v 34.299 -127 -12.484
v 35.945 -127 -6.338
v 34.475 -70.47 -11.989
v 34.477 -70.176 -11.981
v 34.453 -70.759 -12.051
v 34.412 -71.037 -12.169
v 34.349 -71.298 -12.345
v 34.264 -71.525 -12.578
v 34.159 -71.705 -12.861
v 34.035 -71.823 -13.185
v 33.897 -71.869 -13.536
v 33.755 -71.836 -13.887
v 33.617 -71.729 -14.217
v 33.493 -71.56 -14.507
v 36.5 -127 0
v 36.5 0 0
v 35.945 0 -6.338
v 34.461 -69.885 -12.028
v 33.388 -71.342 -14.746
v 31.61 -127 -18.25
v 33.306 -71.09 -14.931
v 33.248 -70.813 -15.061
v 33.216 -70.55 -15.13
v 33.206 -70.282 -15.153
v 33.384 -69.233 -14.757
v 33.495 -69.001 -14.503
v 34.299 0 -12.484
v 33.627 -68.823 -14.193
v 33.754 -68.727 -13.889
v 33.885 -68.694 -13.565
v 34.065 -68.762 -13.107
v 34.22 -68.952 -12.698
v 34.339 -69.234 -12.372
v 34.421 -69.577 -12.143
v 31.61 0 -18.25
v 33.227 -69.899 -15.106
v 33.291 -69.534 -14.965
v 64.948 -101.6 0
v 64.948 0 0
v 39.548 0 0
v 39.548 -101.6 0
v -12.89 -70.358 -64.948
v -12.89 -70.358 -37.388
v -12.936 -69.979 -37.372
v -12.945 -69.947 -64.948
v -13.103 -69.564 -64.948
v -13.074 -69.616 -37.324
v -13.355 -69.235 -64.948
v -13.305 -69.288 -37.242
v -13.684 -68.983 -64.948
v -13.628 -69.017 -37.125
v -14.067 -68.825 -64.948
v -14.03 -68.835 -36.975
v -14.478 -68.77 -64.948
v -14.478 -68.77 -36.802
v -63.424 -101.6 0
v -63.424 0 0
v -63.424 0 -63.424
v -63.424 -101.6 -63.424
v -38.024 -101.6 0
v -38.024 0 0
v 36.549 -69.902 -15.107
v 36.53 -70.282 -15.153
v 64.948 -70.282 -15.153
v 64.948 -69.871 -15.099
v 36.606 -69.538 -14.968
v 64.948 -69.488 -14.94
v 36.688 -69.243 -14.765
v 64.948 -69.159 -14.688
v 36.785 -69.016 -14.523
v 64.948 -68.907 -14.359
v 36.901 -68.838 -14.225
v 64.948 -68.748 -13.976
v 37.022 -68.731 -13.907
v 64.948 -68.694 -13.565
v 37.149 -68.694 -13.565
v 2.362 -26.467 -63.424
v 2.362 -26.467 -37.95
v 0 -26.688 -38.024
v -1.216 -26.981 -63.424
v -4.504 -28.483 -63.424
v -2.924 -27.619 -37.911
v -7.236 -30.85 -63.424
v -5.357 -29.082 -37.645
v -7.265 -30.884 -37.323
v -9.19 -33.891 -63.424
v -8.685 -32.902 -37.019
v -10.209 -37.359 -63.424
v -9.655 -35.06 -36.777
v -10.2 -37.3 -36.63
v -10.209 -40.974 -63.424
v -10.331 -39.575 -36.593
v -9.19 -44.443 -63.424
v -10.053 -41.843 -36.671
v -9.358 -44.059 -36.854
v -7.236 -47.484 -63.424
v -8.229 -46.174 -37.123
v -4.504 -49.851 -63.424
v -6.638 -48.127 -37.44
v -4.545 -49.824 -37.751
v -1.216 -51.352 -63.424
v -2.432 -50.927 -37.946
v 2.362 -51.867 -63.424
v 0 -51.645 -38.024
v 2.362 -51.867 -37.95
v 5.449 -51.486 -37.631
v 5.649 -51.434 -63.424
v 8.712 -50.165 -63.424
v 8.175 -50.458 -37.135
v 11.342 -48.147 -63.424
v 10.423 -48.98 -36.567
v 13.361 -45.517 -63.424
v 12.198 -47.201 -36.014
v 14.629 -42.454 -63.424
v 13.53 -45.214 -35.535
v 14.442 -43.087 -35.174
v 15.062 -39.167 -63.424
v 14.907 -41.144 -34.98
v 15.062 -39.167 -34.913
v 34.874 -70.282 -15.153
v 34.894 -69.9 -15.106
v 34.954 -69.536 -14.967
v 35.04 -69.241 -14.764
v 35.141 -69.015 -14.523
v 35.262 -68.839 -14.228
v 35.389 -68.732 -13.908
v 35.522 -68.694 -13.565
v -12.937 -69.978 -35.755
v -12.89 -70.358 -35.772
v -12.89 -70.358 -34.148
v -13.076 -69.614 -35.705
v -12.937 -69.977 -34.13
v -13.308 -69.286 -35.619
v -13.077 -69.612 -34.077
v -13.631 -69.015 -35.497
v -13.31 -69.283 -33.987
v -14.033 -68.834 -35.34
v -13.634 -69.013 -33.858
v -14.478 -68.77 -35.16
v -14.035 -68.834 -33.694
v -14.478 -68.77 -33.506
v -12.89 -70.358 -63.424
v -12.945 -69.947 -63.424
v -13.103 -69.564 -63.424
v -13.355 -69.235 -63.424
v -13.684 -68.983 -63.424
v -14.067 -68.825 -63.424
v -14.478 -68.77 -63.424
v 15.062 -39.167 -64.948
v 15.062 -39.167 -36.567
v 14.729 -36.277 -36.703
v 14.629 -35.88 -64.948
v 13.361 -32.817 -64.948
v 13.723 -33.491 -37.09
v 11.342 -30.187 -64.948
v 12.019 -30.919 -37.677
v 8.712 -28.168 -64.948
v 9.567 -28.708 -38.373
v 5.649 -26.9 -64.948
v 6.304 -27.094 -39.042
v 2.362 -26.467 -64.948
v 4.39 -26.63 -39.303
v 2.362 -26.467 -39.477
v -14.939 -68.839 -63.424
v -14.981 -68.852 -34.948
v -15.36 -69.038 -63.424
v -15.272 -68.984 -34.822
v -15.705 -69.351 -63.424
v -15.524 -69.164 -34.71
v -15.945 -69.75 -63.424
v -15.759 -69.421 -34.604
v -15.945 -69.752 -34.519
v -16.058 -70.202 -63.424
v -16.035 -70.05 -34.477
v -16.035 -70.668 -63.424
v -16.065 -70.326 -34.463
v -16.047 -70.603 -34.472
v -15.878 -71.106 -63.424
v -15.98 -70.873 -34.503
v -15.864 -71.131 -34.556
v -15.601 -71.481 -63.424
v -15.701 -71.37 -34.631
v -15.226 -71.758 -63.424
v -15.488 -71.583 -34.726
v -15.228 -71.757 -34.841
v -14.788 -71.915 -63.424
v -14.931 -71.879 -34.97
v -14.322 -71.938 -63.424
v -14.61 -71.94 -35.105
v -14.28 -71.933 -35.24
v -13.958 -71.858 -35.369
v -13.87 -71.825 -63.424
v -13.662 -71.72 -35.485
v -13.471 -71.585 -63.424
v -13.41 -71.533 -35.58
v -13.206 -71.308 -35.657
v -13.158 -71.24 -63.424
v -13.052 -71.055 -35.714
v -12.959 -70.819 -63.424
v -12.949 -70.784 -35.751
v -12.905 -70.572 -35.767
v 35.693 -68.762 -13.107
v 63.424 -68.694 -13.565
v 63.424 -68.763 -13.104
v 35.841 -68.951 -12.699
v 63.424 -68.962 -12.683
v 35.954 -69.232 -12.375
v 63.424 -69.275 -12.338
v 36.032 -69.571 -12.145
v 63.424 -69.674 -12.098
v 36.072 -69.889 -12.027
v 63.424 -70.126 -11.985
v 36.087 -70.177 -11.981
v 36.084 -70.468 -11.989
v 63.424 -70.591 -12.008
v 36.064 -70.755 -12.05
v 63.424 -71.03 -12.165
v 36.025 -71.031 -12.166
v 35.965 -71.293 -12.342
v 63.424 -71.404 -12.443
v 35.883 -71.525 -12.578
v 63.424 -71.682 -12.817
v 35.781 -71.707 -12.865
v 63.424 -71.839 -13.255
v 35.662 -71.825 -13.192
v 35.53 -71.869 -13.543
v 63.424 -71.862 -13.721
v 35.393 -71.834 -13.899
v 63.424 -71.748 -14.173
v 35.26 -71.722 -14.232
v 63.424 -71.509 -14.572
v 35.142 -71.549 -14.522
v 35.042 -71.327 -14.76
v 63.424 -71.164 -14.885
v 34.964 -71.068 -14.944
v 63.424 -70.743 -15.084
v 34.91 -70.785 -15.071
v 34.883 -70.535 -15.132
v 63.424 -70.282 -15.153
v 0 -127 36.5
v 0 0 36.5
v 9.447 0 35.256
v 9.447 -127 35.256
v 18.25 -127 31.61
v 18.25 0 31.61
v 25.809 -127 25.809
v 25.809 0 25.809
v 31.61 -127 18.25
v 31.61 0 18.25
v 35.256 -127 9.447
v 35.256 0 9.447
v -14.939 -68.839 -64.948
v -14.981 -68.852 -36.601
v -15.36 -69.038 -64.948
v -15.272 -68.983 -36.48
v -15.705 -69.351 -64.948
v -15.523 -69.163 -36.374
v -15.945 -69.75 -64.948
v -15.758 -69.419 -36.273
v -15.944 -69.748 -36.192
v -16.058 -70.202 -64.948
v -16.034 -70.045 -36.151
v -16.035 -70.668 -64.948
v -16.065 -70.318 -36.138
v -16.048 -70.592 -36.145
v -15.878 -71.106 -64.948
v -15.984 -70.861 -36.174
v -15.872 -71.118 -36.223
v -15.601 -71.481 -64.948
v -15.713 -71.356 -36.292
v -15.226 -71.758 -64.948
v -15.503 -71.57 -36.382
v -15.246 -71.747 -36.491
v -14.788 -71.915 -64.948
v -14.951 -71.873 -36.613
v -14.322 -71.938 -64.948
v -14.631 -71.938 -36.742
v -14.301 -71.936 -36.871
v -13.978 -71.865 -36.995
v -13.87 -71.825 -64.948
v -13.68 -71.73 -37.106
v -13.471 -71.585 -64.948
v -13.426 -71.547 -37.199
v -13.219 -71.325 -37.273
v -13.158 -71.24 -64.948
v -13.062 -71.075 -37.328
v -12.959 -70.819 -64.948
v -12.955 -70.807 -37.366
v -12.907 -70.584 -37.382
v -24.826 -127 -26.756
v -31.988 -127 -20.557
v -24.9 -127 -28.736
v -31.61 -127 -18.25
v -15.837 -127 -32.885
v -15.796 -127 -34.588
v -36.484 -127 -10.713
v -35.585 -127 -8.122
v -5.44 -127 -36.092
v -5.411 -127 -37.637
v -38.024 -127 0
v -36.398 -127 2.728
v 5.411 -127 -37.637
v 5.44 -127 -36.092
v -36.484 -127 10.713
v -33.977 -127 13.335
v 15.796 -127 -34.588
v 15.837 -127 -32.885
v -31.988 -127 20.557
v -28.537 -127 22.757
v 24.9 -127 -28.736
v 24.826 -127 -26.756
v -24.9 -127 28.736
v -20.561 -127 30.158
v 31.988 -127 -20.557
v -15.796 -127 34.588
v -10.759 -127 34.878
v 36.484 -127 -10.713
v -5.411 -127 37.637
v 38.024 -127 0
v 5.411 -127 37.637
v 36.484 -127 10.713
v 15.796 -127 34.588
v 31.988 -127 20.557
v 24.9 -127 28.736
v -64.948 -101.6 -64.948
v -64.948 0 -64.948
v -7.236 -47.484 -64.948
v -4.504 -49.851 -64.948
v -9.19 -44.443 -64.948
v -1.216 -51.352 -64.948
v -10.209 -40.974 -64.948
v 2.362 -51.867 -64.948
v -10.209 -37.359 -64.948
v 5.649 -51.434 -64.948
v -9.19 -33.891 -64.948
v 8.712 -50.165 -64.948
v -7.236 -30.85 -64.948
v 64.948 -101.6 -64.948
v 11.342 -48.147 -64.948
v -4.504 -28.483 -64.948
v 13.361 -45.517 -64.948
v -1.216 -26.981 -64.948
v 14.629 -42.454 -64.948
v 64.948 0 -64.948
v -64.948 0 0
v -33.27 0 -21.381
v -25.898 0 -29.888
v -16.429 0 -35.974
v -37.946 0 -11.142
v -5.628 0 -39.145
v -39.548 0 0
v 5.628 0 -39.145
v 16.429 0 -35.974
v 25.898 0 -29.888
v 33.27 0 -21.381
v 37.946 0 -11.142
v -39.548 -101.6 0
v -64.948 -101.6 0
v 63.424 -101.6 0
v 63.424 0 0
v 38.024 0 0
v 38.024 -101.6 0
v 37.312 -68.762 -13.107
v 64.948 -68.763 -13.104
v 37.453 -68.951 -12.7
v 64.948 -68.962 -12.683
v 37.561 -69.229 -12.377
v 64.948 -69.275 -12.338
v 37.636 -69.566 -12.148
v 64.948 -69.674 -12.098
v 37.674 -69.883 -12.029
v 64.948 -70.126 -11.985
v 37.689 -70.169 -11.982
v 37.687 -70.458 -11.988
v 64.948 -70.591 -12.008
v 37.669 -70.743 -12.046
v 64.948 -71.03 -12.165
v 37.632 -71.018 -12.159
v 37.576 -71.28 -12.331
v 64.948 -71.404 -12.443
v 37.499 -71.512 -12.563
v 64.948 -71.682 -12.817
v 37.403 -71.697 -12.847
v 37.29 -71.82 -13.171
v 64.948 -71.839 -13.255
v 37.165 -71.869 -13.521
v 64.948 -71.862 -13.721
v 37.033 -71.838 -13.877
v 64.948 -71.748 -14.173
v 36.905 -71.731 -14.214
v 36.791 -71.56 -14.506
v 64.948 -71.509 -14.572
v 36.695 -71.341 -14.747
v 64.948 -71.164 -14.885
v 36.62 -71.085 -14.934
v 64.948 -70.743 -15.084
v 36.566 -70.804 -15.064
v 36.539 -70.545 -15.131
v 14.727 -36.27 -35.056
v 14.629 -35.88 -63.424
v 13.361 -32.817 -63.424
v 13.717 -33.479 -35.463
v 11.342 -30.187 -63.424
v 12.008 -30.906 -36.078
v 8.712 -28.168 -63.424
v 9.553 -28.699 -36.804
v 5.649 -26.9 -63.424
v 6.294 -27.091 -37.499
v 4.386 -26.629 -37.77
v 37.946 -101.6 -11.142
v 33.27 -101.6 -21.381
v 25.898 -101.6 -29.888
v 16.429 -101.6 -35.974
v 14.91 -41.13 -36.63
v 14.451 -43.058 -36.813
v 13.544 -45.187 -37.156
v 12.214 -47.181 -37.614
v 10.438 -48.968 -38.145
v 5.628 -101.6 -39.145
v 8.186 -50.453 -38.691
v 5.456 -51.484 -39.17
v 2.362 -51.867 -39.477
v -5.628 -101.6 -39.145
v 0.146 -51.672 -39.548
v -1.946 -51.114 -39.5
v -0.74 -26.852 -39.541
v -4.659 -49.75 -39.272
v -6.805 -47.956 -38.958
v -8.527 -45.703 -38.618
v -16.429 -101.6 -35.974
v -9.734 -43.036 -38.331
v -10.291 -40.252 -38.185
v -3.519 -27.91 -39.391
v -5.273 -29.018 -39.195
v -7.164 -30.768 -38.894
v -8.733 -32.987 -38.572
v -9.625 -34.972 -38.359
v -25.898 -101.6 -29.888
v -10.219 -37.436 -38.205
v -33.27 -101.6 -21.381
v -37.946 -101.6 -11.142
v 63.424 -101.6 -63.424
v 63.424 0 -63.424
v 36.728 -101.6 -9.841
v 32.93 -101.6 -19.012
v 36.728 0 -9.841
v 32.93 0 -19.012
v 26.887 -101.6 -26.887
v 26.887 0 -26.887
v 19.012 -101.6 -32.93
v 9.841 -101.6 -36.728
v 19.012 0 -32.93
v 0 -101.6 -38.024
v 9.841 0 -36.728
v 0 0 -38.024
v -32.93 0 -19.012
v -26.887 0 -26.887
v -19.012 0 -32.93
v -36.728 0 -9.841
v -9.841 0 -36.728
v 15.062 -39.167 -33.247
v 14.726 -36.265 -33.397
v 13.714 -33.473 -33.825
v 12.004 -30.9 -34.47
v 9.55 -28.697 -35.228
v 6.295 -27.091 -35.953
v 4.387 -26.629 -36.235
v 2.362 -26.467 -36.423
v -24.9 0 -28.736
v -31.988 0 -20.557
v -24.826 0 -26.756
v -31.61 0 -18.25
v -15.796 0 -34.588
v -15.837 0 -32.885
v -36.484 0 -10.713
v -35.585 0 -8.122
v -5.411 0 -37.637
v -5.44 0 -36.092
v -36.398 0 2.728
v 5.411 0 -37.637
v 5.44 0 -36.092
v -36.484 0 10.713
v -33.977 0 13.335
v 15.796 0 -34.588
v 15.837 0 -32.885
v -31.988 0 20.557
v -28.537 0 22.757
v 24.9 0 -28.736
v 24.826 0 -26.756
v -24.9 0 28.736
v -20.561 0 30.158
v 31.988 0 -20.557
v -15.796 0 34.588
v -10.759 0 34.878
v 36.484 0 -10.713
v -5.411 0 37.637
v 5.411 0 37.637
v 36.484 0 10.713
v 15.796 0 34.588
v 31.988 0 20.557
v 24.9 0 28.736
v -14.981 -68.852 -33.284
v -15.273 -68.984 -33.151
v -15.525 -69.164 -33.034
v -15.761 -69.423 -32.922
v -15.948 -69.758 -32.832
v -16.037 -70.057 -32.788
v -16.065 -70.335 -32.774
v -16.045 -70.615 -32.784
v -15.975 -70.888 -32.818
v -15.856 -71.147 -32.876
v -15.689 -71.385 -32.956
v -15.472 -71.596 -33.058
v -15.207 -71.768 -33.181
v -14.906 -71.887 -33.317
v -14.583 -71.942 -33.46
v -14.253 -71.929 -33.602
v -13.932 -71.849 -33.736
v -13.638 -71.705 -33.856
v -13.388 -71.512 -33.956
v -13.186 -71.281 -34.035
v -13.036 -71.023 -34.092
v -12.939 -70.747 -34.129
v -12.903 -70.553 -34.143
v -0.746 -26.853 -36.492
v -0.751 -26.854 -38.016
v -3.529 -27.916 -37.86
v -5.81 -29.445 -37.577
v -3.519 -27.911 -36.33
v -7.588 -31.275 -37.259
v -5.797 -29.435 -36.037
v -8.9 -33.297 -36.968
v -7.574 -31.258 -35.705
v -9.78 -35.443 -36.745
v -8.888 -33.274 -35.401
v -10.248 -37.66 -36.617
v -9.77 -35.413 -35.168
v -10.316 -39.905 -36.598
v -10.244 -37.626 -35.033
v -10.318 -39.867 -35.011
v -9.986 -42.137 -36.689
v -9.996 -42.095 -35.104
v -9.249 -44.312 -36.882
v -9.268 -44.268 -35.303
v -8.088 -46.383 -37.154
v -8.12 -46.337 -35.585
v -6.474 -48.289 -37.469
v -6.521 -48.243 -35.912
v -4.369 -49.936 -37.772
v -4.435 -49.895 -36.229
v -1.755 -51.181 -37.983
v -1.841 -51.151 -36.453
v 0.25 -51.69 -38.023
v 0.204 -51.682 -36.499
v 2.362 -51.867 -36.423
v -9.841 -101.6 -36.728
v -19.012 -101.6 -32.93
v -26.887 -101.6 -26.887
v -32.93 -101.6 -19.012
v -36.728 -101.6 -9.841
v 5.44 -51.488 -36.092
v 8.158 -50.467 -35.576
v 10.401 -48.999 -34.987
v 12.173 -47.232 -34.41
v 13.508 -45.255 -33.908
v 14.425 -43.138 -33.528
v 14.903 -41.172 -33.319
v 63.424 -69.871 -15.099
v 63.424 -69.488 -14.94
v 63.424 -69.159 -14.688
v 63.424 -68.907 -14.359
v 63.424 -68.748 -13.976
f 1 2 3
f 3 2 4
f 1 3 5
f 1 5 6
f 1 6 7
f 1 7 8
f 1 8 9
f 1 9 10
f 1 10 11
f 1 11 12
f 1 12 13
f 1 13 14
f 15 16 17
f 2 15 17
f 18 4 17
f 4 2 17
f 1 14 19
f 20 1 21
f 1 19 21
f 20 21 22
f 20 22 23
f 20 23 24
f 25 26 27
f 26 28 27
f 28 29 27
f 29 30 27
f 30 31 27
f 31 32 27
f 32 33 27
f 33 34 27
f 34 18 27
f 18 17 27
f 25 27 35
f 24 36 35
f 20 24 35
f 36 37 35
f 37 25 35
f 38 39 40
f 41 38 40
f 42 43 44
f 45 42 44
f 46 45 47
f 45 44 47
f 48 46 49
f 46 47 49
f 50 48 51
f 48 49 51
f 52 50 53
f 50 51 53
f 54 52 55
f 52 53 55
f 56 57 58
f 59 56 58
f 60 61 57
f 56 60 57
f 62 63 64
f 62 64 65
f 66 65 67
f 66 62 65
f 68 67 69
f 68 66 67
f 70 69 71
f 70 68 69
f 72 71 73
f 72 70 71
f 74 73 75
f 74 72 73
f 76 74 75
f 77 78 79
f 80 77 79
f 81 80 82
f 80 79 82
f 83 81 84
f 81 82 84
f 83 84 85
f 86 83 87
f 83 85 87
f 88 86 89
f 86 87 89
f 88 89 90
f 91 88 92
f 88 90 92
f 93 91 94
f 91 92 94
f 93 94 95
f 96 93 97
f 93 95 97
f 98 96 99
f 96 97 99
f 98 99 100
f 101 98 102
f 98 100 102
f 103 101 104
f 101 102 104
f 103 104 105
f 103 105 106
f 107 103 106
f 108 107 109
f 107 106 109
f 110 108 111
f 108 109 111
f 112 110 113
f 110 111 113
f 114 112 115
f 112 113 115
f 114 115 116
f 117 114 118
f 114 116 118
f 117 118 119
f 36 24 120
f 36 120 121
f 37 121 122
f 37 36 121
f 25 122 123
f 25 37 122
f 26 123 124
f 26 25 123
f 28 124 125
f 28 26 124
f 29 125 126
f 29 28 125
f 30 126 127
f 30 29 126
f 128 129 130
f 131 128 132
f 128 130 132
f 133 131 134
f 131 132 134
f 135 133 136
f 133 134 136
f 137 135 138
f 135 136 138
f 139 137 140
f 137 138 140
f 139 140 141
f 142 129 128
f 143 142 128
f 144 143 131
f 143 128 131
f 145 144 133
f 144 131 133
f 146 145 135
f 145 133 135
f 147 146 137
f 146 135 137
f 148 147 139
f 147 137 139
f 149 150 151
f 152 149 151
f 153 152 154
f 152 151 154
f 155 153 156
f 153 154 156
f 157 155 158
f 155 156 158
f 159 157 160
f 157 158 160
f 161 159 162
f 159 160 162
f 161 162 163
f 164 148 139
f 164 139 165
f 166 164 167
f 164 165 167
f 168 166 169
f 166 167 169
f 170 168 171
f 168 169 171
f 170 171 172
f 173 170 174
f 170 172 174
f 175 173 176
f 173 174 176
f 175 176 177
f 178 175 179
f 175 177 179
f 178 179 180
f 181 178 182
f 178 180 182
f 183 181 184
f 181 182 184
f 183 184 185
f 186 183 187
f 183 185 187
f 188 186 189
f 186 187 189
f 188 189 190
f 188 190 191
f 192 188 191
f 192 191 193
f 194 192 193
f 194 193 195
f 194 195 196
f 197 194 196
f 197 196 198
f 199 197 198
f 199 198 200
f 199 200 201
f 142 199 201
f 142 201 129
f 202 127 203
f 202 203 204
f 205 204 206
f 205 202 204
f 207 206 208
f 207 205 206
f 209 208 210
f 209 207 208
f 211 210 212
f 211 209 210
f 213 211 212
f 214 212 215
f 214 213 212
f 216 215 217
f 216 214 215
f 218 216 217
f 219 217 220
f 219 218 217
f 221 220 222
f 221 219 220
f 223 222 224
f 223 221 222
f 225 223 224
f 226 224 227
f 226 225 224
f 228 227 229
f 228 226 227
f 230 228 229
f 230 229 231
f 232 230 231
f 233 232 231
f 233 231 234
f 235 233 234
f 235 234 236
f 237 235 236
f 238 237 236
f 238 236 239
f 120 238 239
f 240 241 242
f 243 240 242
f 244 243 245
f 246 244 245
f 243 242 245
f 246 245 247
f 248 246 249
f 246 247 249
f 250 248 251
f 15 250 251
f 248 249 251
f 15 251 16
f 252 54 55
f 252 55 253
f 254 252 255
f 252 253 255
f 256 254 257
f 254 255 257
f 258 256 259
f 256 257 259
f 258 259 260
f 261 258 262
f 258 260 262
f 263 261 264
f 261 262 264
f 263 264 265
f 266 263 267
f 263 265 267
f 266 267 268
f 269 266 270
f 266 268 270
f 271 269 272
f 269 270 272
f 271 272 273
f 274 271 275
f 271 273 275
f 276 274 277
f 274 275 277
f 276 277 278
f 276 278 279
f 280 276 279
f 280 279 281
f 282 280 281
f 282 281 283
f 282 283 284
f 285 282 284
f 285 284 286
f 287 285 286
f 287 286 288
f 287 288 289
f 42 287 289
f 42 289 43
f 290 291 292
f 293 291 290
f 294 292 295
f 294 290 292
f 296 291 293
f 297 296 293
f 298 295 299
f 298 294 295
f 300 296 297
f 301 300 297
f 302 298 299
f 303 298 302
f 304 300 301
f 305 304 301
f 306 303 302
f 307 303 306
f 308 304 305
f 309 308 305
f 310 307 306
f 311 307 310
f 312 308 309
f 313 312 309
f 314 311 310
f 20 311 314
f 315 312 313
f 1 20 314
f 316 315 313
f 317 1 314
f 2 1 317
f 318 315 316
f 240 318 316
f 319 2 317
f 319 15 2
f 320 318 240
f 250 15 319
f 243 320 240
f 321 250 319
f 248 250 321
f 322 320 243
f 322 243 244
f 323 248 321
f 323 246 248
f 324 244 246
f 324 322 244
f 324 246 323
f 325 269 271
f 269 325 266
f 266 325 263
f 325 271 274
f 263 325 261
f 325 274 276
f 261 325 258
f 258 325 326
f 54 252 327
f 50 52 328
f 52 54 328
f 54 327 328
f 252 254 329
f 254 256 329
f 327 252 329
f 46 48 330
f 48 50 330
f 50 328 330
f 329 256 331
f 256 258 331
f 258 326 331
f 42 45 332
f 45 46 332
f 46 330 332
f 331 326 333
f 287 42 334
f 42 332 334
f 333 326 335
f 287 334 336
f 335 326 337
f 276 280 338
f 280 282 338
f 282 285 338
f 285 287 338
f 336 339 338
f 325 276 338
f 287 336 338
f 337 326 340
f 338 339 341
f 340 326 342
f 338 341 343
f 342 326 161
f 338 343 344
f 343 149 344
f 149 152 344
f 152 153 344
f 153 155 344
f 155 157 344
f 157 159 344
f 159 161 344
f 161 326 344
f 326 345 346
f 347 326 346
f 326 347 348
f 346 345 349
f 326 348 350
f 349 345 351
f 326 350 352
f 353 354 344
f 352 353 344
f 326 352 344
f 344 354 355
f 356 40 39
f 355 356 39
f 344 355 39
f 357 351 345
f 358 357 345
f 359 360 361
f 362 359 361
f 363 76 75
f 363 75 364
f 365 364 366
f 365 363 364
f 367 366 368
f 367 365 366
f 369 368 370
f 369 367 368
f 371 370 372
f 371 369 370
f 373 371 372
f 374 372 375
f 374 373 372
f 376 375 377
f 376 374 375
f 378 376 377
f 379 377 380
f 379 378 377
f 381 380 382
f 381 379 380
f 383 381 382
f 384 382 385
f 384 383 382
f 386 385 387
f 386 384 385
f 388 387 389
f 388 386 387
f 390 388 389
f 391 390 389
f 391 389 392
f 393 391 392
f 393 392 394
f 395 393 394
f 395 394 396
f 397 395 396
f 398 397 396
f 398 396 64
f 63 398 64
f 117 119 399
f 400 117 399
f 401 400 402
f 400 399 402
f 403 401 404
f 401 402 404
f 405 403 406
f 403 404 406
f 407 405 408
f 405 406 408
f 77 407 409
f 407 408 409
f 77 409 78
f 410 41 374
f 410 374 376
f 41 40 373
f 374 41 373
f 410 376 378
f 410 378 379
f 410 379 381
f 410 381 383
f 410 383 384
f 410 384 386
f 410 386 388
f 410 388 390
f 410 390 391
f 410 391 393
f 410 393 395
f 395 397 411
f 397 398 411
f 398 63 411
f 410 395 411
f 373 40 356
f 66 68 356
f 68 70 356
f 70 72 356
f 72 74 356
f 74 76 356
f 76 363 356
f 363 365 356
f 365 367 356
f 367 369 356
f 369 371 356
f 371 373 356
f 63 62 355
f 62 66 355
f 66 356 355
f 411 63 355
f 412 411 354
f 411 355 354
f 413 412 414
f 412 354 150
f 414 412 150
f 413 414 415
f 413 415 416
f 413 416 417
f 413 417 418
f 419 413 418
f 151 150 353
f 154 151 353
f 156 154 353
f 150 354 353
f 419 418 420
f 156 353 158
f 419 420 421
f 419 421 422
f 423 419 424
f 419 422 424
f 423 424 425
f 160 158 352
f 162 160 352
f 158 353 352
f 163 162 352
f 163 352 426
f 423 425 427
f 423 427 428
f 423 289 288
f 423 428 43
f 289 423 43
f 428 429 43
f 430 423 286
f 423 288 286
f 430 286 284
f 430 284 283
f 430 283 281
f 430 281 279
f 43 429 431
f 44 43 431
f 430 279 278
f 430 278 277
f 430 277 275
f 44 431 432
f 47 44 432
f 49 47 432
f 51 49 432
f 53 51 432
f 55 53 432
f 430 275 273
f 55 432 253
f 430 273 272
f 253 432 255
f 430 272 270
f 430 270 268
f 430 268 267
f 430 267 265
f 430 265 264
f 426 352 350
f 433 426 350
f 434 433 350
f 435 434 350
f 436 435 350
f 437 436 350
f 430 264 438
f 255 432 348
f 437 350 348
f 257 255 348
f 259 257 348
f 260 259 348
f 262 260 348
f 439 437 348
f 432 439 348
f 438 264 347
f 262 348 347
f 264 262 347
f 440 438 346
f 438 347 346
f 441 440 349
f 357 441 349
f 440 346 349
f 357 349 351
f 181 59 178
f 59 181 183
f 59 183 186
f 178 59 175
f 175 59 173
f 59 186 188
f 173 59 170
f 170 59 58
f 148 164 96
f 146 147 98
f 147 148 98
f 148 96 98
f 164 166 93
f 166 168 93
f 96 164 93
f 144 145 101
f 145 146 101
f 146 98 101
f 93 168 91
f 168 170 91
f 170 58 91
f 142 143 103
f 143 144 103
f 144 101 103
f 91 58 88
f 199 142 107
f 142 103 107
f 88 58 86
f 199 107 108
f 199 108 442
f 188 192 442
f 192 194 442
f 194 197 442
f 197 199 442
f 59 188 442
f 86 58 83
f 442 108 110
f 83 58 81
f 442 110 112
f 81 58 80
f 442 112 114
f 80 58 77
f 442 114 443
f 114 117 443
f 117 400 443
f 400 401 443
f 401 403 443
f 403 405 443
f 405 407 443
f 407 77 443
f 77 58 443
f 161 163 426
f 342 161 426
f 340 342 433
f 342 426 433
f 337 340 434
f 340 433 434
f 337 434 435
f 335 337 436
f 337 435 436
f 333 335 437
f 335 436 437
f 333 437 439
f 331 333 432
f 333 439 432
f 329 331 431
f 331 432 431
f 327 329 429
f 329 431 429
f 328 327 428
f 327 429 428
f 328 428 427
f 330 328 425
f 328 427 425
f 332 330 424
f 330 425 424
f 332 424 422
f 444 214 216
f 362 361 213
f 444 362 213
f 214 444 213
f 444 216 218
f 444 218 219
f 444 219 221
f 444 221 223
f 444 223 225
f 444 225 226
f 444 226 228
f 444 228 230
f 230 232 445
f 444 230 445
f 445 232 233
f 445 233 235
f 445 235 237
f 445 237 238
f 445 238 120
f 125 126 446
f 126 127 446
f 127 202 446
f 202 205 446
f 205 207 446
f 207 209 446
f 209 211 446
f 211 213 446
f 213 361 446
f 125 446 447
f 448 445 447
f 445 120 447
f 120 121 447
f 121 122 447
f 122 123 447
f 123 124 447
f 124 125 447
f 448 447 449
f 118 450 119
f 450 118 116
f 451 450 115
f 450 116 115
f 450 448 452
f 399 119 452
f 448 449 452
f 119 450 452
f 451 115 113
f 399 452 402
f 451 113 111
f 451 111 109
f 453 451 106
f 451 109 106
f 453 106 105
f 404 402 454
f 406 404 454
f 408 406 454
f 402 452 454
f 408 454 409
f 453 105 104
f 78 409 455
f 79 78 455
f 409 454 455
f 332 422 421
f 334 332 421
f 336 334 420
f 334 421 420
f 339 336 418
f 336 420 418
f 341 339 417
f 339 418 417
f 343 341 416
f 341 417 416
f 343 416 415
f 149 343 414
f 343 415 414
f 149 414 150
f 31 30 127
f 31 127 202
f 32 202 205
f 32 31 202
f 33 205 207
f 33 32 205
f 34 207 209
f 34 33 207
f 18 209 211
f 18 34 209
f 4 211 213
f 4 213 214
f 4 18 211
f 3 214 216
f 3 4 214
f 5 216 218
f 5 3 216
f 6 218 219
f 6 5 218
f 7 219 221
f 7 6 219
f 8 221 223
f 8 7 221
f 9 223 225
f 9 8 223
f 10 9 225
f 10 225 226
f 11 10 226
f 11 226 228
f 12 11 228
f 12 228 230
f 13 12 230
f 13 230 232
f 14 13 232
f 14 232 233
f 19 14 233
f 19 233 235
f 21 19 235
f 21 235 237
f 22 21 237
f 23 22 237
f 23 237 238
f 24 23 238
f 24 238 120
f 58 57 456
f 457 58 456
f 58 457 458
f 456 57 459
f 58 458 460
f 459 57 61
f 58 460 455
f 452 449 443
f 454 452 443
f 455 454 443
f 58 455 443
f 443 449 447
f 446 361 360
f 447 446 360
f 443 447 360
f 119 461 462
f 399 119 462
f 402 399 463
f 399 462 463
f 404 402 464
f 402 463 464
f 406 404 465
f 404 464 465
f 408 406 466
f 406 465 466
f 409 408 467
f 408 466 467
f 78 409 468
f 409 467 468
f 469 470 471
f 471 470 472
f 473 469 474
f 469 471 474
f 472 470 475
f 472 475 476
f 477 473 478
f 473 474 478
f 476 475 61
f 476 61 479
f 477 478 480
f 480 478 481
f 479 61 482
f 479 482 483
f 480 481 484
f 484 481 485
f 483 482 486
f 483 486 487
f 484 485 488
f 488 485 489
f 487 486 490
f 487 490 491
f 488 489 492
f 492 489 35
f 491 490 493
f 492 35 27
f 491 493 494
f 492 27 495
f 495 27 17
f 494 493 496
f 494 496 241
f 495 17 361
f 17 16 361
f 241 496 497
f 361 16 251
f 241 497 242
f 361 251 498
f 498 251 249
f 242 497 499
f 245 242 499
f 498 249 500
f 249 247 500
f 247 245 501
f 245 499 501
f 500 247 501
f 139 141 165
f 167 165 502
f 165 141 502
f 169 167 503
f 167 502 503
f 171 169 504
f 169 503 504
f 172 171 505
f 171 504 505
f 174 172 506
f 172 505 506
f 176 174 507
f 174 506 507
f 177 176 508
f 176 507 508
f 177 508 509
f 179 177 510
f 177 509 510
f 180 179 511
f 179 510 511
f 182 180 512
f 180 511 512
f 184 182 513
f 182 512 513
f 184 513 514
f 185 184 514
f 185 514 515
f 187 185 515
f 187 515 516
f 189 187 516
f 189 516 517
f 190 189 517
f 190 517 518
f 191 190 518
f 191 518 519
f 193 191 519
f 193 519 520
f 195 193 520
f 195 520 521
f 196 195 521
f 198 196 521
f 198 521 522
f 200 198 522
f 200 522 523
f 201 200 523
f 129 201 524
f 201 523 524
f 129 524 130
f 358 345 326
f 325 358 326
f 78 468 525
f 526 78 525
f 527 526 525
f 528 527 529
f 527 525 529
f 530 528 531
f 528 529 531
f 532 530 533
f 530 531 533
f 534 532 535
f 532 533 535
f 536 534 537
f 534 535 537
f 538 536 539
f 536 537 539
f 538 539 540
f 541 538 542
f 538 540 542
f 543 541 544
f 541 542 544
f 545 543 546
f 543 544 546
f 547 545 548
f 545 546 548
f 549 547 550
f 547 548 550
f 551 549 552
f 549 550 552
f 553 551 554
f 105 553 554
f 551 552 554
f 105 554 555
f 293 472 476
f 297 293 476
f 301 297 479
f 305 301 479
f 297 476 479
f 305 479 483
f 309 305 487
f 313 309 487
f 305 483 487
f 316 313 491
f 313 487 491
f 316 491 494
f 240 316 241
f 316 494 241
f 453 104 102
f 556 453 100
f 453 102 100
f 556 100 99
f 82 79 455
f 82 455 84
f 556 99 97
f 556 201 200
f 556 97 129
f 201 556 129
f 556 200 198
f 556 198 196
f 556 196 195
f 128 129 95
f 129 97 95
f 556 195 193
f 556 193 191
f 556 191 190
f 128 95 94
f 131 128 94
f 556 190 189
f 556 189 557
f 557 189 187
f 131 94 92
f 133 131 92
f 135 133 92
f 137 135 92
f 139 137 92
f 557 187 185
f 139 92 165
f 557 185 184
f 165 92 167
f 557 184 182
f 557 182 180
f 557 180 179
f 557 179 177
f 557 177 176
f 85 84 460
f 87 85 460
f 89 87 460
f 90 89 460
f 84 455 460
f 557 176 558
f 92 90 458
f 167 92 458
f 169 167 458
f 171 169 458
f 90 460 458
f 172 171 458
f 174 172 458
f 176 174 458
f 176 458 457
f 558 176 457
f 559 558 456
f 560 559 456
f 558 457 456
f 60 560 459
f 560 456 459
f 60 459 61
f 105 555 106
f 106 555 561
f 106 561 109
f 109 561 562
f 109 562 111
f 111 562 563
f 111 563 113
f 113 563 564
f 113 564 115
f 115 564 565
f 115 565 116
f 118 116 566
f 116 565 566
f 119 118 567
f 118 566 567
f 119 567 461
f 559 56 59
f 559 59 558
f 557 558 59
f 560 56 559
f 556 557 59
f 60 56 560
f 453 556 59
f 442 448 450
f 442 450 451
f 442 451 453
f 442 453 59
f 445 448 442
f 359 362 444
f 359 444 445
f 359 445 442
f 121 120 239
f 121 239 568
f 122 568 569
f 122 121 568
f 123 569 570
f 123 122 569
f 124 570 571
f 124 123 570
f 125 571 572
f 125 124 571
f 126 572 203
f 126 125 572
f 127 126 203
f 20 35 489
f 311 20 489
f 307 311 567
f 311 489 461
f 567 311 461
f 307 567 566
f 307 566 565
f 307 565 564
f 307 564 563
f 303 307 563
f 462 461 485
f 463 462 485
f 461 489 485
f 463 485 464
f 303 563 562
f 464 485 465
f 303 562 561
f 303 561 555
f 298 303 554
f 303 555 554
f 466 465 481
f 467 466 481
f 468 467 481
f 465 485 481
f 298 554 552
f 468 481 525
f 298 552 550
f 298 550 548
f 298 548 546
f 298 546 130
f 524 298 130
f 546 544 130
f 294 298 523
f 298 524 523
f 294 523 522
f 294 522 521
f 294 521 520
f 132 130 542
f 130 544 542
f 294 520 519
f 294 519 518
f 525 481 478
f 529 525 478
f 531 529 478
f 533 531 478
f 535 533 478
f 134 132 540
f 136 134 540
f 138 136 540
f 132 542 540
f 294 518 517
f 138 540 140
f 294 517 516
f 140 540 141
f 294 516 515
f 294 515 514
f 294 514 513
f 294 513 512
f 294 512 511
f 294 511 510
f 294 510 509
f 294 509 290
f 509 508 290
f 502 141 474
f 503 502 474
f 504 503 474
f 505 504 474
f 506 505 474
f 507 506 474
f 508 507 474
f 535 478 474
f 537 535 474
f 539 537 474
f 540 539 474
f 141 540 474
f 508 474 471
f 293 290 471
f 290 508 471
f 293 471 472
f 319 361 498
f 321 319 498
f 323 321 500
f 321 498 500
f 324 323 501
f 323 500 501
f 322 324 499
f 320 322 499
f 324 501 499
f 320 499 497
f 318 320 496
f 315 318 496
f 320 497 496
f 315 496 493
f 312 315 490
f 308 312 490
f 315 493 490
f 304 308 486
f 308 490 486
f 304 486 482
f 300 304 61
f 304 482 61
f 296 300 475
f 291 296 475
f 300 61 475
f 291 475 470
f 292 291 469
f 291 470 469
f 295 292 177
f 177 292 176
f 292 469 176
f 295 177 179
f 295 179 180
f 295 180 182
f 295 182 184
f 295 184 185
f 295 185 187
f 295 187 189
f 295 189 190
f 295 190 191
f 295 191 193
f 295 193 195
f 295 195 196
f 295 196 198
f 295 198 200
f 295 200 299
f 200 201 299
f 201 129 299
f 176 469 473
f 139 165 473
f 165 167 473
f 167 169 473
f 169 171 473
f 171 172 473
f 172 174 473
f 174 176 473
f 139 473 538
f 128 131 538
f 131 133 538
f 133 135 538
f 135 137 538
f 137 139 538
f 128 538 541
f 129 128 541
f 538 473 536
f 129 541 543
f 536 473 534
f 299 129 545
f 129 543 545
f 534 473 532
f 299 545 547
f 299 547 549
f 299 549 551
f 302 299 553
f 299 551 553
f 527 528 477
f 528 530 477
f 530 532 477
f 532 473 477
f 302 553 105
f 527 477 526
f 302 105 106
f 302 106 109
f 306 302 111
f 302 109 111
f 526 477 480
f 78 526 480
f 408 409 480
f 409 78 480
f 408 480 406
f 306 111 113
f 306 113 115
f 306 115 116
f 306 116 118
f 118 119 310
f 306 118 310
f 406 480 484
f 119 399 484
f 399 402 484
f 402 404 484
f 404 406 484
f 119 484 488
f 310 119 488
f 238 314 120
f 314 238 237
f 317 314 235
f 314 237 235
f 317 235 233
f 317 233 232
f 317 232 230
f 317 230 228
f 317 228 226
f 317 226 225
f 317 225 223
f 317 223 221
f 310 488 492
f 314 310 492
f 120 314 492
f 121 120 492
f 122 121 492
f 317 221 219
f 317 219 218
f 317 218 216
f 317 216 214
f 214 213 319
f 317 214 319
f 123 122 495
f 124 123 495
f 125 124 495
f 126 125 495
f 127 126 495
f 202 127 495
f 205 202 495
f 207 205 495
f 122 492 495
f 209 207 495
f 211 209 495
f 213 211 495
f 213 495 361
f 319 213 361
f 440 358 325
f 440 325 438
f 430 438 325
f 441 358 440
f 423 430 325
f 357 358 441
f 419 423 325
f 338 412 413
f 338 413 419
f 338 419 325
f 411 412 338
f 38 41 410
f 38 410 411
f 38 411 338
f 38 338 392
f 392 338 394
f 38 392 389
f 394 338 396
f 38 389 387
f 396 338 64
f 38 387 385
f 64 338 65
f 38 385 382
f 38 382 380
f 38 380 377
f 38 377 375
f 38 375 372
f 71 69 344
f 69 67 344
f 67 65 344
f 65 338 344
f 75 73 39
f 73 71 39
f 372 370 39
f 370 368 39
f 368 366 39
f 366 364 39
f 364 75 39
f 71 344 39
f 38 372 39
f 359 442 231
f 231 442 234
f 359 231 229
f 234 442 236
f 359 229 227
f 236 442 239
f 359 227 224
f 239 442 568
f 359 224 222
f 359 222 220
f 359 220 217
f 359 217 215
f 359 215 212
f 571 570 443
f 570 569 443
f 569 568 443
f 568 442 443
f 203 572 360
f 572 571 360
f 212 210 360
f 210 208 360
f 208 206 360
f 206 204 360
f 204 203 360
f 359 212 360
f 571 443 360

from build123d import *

# Parameters (mm, degrees)
F0_R      = 38.0238
F2_DEPTH  = 127
F4_DEPTH  = 127
F5_DEPTH  = 127
F6_DEPTH  = 127
F9_DEPTH  = 101.6
F12_DEPTH = 101.6


with BuildPart() as f2:
    # F0 (on Front) → F2 (new body)
    with BuildSketch(Plane.XZ):
        Circle(F0_R)
        with BuildLine():
            ThreePointArc((0, 36.4998), (25.809256092, 25.809256092), (36.4998, 0))
            ThreePointArc((36.4998, 0), (35.2560994744, -9.4468433824), (31.6097540331, -18.2499))
            ThreePointArc((31.6097540331, -18.2499), (0, -36.4998), (-31.6097540331, -18.2499))
            ThreePointArc((-31.6097540331, -18.2499), (-31.6097540331, 18.2499), (0, 36.4998))
        make_face(mode=Mode.SUBTRACT)
    extrude(amount=F2_DEPTH)


with BuildPart() as f4:
    # F3 (on Top) → F4 (new body)
    with BuildSketch(Plane.XY):
        with BuildLine():
            ThreePointArc((2.3622, -51.8668), (11.3424561211, -48.1470561211), (15.0622, -39.1668))
            ThreePointArc((15.0622, -39.1668), (11.3424561211, -30.1865438789), (2.3622, -26.4668))
            Line((2.3622, -26.4668), (2.3622, -51.8668))
        make_face()
        with BuildLine():
            Line((2.3622, -51.8668), (2.3622, -26.4668))
            ThreePointArc((2.3622, -26.4668), (-10.3378, -39.1668), (2.3622, -51.8668))
        make_face()
    extrude(amount=-F4_DEPTH)


with BuildPart() as f5:
    # F3 (on Top) → F5 (new body)
    with BuildSketch(Plane.XY):
        with BuildLine():
            ThreePointArc((-12.8905, -70.358), (-13.3554679849, -69.2354679849), (-14.478, -68.7705))
            ThreePointArc((-14.478, -68.7705), (-15.6005320151, -71.4805320151), (-12.8905, -70.358))
        make_face()
    extrude(amount=-F5_DEPTH)


with BuildPart() as f6:
    # F1 (on Right) → F6 (new body)
    with BuildSketch(Plane.YZ):
        with BuildLine():
            ThreePointArc((-70.2816930812, -15.1526582448), (-69.159161066, -14.6876902599), (-68.6941930812, -13.5651582448))
            ThreePointArc((-68.6941930812, -13.5651582448), (-71.4042250963, -12.4426262296), (-70.2816930812, -15.1526582448))
        make_face()
    extrude(amount=F6_DEPTH)


with BuildPart() as f2_1:
    add(f2.part)

    # F7: cut F4, F5, F6
    add(f4.part, mode=Mode.SUBTRACT)
    add(f5.part, mode=Mode.SUBTRACT)
    add(f6.part, mode=Mode.SUBTRACT)


with BuildPart() as f9:
    # F8 (on Front) → F9 (new body)
    with BuildSketch(Plane.XZ):
        with BuildLine():
            ThreePointArc((0, -38.0238), (-26.8868868265, -26.8868868265), (-38.0238, 0))
            Line((-38.0238, 0), (-63.4238, 0))
            Line((-63.4238, 0), (-63.4238, -63.4238))
            Line((-63.4238, -63.4238), (0, -63.4238))
            Line((0, -63.4238), (0, -38.0238))
        make_face()
        with BuildLine():
            Line((63.4238, 0), (38.0238, 0))
            ThreePointArc((38.0238, 0), (26.8868868265, -26.8868868265), (0, -38.0238))
            Line((0, -38.0238), (0, -63.4238))
            Line((0, -63.4238), (63.4238, -63.4238))
            Line((63.4238, -63.4238), (63.4238, 0))
        make_face()
    extrude(amount=F9_DEPTH)

    # F10: cut F5, F4, F6
    add(f5.part, mode=Mode.SUBTRACT)
    add(f4.part, mode=Mode.SUBTRACT)
    add(f6.part, mode=Mode.SUBTRACT)


with BuildPart() as f12:
    # F11 (on Front) → F12 (new body)
    with BuildSketch(Plane.XZ):
        with BuildLine():
            ThreePointArc((39.5478, 0), (0, -39.5478), (-39.5478, 0))
            Line((-39.5478, 0), (-64.9478, 0))
            Line((-64.9478, 0), (-64.9478, -64.9478))
            Line((-64.9478, -64.9478), (64.9478, -64.9478))
            Line((64.9478, -64.9478), (64.9478, 0))
            Line((64.9478, 0), (39.5478, 0))
        make_face()
    extrude(amount=F12_DEPTH)

    # F13: cut F5, F4, F6
    add(f5.part, mode=Mode.SUBTRACT)
    add(f4.part, mode=Mode.SUBTRACT)
    add(f6.part, mode=Mode.SUBTRACT)


solid = Compound([f2_1.part, f9.part, f12.part])
